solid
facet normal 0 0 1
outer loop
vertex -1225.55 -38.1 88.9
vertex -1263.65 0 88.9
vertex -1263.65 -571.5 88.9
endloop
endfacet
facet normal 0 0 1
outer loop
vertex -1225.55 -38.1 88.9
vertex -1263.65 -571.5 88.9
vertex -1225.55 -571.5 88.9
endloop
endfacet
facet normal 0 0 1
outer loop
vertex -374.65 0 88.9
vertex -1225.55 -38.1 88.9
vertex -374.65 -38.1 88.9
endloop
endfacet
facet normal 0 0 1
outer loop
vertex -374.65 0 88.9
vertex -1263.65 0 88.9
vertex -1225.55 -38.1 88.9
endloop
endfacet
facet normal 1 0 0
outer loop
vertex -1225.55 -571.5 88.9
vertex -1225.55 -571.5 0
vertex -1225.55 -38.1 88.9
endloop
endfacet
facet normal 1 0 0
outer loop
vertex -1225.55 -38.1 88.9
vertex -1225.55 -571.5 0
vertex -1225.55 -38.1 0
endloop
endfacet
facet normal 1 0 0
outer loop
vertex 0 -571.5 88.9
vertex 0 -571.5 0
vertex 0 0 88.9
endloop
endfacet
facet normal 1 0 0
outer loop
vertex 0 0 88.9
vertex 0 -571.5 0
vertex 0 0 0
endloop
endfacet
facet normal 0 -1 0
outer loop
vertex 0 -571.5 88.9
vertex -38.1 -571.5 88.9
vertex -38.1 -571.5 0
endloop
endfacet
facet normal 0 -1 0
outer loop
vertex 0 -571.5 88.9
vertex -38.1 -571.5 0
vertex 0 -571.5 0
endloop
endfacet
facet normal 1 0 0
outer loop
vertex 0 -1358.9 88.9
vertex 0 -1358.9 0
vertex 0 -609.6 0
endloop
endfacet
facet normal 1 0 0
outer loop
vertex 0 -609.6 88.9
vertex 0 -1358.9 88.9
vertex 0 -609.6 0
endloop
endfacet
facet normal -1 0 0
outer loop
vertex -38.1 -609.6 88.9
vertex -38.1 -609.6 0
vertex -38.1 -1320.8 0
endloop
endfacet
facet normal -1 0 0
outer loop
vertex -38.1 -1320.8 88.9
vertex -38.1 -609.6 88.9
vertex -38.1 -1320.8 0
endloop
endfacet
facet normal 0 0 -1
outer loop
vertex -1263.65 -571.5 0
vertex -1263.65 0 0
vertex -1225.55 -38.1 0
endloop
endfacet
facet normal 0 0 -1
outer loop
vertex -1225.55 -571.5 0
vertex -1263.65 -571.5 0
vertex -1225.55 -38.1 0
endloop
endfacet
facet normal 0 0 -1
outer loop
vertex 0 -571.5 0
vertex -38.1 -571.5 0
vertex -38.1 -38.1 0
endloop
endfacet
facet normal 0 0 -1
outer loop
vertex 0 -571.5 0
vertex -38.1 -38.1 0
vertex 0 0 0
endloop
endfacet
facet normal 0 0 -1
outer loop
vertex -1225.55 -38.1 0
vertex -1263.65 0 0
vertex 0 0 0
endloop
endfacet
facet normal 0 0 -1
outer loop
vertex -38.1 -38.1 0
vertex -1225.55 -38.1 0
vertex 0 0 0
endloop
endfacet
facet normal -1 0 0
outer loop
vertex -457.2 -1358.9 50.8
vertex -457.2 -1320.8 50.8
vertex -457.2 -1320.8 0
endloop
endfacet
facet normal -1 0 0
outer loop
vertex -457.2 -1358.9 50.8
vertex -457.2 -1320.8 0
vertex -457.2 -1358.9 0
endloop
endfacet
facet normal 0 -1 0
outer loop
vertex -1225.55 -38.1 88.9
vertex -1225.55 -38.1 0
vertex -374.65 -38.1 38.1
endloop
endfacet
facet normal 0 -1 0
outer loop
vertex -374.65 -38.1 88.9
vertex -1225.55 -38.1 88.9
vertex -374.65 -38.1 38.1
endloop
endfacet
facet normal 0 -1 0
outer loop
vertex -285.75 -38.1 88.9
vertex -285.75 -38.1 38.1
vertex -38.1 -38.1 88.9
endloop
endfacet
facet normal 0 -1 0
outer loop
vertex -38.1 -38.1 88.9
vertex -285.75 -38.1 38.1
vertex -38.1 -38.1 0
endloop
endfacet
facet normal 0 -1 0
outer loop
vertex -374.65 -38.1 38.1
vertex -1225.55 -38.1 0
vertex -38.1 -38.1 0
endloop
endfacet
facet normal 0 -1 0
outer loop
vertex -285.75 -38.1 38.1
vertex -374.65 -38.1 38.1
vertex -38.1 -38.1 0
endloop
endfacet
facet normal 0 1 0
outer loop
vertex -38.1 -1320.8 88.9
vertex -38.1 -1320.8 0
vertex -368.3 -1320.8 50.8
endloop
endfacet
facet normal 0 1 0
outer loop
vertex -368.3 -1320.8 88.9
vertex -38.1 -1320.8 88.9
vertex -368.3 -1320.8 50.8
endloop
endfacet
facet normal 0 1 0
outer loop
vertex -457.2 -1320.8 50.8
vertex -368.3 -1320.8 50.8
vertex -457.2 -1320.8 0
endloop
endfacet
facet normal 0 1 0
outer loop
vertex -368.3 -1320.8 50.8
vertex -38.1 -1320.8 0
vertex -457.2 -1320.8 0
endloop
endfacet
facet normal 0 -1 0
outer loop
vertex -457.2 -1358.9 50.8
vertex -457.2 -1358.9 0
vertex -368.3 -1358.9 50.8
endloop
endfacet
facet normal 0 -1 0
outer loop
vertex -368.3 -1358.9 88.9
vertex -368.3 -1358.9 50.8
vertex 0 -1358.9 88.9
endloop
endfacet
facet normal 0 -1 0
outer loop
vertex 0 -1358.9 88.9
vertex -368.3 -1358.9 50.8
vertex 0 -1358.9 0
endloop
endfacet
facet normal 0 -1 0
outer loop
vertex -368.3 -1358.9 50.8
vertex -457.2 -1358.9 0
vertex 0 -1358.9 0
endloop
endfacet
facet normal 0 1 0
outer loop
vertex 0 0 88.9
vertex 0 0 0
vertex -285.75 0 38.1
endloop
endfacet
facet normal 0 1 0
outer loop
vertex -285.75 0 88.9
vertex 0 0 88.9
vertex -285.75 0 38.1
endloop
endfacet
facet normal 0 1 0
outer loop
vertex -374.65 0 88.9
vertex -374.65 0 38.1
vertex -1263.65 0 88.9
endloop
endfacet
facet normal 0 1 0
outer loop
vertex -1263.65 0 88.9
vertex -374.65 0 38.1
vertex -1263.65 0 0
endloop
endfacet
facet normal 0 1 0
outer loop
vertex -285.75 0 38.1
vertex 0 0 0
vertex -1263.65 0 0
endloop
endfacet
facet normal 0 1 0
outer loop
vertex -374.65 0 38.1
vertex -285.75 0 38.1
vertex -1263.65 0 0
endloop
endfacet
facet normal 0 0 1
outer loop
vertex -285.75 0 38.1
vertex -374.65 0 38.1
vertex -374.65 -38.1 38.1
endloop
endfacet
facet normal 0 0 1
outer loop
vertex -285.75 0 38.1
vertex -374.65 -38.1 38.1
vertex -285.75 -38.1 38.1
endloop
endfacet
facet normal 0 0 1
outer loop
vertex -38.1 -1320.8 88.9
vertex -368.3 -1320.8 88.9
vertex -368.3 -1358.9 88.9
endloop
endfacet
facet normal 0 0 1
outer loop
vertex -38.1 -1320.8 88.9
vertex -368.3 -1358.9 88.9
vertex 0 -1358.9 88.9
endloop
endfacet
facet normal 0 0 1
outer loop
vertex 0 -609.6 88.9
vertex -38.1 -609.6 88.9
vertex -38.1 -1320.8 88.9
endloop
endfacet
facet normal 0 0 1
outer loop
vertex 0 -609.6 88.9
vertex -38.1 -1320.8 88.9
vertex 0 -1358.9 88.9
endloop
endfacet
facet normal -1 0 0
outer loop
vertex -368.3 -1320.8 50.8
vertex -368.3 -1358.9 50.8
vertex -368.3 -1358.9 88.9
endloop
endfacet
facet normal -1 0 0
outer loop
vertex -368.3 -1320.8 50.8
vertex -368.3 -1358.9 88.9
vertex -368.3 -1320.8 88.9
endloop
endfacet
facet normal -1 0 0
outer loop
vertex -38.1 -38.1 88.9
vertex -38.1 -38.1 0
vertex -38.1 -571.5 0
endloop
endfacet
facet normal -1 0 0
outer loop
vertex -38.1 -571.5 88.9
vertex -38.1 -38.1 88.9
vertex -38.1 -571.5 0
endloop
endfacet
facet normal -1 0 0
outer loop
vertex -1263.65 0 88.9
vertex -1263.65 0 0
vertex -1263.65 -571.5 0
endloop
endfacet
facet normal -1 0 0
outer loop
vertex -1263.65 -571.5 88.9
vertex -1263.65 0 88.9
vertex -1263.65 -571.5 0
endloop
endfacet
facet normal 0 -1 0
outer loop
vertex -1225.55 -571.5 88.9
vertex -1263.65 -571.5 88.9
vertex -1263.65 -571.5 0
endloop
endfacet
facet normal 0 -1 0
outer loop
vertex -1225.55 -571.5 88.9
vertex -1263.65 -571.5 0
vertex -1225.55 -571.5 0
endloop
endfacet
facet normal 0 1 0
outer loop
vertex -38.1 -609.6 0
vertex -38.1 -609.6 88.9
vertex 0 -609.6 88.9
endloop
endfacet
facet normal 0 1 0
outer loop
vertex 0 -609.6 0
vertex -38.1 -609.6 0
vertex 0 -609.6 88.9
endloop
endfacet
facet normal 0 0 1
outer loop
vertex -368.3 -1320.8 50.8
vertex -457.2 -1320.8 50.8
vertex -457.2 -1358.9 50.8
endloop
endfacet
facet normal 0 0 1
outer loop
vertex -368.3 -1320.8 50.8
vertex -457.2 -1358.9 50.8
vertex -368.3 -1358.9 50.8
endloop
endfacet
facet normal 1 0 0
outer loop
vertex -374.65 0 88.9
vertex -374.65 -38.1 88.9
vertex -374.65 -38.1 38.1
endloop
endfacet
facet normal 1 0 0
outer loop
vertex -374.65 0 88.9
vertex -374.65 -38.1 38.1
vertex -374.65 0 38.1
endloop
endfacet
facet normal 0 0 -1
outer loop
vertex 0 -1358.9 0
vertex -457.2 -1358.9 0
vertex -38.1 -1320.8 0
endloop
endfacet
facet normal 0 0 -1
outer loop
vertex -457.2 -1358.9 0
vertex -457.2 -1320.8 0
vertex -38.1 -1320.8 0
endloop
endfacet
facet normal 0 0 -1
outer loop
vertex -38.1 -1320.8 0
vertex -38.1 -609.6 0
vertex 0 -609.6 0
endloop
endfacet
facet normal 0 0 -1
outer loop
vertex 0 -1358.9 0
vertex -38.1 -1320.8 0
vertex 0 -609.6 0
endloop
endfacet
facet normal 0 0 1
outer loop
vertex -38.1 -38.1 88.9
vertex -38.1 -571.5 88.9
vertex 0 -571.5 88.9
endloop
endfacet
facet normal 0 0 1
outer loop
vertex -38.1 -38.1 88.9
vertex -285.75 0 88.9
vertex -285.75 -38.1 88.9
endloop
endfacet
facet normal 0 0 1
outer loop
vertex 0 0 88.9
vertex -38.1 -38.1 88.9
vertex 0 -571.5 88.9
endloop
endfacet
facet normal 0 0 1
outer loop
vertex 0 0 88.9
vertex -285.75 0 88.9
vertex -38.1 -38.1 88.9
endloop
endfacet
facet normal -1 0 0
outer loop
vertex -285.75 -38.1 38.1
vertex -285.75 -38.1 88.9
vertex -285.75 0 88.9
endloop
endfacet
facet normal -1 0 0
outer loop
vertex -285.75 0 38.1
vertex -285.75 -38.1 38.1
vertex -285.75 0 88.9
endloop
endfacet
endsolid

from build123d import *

# Parameters (mm, degrees)
F1_DEPTH = 88.9
F2_W     = 38.1
F2_H     = 38.1
F3_DEPTH = 88.9
F4_W     = 88.9
F4_H     = 38.1
F5_DEPTH = 38.1
F6_W     = 88.9
F6_H     = 38.1
F7_DEPTH = 50.8


with BuildPart() as f1:
    # F0 (on Top) → F1 (new body)
    with BuildSketch(Plane.XY):
        Polygon((0, -1358.9), (0, 0), (-1263.65, 0), (-1263.65, -609.6), (-1225.55, -609.6), (-1225.55, -38.1), (-38.1, -38.1), (-38.1, -1320.8), (-457.2, -1320.8), (-457.2, -1358.9), align=None)
    extrude(amount=F1_DEPTH)

    # F2 (on face) → F3 (cut)
    with BuildSketch(Plane.XY.offset(88.9)):
        with Locations((-19.05, -590.55)):
            Rectangle(F2_W, F2_H)
        with Locations((-1244.6, -590.55)):
            Rectangle(F2_W, F2_H)
    extrude(amount=-F3_DEPTH, mode=Mode.SUBTRACT)

    # F4 (on face) → F5 (cut)
    with BuildSketch(Plane.XY.offset(88.9)):
        with Locations((-412.75, -1339.85)):
            Rectangle(F4_W, F4_H)
    extrude(amount=-F5_DEPTH, mode=Mode.SUBTRACT)

    # F6 (on face) → F7 (cut)
    with BuildSketch(Plane.XY.offset(88.9)):
        with Locations((-330.2, -19.05)):
            Rectangle(F6_W, F6_H)
    extrude(amount=-F7_DEPTH, mode=Mode.SUBTRACT)


solid = f1.part
